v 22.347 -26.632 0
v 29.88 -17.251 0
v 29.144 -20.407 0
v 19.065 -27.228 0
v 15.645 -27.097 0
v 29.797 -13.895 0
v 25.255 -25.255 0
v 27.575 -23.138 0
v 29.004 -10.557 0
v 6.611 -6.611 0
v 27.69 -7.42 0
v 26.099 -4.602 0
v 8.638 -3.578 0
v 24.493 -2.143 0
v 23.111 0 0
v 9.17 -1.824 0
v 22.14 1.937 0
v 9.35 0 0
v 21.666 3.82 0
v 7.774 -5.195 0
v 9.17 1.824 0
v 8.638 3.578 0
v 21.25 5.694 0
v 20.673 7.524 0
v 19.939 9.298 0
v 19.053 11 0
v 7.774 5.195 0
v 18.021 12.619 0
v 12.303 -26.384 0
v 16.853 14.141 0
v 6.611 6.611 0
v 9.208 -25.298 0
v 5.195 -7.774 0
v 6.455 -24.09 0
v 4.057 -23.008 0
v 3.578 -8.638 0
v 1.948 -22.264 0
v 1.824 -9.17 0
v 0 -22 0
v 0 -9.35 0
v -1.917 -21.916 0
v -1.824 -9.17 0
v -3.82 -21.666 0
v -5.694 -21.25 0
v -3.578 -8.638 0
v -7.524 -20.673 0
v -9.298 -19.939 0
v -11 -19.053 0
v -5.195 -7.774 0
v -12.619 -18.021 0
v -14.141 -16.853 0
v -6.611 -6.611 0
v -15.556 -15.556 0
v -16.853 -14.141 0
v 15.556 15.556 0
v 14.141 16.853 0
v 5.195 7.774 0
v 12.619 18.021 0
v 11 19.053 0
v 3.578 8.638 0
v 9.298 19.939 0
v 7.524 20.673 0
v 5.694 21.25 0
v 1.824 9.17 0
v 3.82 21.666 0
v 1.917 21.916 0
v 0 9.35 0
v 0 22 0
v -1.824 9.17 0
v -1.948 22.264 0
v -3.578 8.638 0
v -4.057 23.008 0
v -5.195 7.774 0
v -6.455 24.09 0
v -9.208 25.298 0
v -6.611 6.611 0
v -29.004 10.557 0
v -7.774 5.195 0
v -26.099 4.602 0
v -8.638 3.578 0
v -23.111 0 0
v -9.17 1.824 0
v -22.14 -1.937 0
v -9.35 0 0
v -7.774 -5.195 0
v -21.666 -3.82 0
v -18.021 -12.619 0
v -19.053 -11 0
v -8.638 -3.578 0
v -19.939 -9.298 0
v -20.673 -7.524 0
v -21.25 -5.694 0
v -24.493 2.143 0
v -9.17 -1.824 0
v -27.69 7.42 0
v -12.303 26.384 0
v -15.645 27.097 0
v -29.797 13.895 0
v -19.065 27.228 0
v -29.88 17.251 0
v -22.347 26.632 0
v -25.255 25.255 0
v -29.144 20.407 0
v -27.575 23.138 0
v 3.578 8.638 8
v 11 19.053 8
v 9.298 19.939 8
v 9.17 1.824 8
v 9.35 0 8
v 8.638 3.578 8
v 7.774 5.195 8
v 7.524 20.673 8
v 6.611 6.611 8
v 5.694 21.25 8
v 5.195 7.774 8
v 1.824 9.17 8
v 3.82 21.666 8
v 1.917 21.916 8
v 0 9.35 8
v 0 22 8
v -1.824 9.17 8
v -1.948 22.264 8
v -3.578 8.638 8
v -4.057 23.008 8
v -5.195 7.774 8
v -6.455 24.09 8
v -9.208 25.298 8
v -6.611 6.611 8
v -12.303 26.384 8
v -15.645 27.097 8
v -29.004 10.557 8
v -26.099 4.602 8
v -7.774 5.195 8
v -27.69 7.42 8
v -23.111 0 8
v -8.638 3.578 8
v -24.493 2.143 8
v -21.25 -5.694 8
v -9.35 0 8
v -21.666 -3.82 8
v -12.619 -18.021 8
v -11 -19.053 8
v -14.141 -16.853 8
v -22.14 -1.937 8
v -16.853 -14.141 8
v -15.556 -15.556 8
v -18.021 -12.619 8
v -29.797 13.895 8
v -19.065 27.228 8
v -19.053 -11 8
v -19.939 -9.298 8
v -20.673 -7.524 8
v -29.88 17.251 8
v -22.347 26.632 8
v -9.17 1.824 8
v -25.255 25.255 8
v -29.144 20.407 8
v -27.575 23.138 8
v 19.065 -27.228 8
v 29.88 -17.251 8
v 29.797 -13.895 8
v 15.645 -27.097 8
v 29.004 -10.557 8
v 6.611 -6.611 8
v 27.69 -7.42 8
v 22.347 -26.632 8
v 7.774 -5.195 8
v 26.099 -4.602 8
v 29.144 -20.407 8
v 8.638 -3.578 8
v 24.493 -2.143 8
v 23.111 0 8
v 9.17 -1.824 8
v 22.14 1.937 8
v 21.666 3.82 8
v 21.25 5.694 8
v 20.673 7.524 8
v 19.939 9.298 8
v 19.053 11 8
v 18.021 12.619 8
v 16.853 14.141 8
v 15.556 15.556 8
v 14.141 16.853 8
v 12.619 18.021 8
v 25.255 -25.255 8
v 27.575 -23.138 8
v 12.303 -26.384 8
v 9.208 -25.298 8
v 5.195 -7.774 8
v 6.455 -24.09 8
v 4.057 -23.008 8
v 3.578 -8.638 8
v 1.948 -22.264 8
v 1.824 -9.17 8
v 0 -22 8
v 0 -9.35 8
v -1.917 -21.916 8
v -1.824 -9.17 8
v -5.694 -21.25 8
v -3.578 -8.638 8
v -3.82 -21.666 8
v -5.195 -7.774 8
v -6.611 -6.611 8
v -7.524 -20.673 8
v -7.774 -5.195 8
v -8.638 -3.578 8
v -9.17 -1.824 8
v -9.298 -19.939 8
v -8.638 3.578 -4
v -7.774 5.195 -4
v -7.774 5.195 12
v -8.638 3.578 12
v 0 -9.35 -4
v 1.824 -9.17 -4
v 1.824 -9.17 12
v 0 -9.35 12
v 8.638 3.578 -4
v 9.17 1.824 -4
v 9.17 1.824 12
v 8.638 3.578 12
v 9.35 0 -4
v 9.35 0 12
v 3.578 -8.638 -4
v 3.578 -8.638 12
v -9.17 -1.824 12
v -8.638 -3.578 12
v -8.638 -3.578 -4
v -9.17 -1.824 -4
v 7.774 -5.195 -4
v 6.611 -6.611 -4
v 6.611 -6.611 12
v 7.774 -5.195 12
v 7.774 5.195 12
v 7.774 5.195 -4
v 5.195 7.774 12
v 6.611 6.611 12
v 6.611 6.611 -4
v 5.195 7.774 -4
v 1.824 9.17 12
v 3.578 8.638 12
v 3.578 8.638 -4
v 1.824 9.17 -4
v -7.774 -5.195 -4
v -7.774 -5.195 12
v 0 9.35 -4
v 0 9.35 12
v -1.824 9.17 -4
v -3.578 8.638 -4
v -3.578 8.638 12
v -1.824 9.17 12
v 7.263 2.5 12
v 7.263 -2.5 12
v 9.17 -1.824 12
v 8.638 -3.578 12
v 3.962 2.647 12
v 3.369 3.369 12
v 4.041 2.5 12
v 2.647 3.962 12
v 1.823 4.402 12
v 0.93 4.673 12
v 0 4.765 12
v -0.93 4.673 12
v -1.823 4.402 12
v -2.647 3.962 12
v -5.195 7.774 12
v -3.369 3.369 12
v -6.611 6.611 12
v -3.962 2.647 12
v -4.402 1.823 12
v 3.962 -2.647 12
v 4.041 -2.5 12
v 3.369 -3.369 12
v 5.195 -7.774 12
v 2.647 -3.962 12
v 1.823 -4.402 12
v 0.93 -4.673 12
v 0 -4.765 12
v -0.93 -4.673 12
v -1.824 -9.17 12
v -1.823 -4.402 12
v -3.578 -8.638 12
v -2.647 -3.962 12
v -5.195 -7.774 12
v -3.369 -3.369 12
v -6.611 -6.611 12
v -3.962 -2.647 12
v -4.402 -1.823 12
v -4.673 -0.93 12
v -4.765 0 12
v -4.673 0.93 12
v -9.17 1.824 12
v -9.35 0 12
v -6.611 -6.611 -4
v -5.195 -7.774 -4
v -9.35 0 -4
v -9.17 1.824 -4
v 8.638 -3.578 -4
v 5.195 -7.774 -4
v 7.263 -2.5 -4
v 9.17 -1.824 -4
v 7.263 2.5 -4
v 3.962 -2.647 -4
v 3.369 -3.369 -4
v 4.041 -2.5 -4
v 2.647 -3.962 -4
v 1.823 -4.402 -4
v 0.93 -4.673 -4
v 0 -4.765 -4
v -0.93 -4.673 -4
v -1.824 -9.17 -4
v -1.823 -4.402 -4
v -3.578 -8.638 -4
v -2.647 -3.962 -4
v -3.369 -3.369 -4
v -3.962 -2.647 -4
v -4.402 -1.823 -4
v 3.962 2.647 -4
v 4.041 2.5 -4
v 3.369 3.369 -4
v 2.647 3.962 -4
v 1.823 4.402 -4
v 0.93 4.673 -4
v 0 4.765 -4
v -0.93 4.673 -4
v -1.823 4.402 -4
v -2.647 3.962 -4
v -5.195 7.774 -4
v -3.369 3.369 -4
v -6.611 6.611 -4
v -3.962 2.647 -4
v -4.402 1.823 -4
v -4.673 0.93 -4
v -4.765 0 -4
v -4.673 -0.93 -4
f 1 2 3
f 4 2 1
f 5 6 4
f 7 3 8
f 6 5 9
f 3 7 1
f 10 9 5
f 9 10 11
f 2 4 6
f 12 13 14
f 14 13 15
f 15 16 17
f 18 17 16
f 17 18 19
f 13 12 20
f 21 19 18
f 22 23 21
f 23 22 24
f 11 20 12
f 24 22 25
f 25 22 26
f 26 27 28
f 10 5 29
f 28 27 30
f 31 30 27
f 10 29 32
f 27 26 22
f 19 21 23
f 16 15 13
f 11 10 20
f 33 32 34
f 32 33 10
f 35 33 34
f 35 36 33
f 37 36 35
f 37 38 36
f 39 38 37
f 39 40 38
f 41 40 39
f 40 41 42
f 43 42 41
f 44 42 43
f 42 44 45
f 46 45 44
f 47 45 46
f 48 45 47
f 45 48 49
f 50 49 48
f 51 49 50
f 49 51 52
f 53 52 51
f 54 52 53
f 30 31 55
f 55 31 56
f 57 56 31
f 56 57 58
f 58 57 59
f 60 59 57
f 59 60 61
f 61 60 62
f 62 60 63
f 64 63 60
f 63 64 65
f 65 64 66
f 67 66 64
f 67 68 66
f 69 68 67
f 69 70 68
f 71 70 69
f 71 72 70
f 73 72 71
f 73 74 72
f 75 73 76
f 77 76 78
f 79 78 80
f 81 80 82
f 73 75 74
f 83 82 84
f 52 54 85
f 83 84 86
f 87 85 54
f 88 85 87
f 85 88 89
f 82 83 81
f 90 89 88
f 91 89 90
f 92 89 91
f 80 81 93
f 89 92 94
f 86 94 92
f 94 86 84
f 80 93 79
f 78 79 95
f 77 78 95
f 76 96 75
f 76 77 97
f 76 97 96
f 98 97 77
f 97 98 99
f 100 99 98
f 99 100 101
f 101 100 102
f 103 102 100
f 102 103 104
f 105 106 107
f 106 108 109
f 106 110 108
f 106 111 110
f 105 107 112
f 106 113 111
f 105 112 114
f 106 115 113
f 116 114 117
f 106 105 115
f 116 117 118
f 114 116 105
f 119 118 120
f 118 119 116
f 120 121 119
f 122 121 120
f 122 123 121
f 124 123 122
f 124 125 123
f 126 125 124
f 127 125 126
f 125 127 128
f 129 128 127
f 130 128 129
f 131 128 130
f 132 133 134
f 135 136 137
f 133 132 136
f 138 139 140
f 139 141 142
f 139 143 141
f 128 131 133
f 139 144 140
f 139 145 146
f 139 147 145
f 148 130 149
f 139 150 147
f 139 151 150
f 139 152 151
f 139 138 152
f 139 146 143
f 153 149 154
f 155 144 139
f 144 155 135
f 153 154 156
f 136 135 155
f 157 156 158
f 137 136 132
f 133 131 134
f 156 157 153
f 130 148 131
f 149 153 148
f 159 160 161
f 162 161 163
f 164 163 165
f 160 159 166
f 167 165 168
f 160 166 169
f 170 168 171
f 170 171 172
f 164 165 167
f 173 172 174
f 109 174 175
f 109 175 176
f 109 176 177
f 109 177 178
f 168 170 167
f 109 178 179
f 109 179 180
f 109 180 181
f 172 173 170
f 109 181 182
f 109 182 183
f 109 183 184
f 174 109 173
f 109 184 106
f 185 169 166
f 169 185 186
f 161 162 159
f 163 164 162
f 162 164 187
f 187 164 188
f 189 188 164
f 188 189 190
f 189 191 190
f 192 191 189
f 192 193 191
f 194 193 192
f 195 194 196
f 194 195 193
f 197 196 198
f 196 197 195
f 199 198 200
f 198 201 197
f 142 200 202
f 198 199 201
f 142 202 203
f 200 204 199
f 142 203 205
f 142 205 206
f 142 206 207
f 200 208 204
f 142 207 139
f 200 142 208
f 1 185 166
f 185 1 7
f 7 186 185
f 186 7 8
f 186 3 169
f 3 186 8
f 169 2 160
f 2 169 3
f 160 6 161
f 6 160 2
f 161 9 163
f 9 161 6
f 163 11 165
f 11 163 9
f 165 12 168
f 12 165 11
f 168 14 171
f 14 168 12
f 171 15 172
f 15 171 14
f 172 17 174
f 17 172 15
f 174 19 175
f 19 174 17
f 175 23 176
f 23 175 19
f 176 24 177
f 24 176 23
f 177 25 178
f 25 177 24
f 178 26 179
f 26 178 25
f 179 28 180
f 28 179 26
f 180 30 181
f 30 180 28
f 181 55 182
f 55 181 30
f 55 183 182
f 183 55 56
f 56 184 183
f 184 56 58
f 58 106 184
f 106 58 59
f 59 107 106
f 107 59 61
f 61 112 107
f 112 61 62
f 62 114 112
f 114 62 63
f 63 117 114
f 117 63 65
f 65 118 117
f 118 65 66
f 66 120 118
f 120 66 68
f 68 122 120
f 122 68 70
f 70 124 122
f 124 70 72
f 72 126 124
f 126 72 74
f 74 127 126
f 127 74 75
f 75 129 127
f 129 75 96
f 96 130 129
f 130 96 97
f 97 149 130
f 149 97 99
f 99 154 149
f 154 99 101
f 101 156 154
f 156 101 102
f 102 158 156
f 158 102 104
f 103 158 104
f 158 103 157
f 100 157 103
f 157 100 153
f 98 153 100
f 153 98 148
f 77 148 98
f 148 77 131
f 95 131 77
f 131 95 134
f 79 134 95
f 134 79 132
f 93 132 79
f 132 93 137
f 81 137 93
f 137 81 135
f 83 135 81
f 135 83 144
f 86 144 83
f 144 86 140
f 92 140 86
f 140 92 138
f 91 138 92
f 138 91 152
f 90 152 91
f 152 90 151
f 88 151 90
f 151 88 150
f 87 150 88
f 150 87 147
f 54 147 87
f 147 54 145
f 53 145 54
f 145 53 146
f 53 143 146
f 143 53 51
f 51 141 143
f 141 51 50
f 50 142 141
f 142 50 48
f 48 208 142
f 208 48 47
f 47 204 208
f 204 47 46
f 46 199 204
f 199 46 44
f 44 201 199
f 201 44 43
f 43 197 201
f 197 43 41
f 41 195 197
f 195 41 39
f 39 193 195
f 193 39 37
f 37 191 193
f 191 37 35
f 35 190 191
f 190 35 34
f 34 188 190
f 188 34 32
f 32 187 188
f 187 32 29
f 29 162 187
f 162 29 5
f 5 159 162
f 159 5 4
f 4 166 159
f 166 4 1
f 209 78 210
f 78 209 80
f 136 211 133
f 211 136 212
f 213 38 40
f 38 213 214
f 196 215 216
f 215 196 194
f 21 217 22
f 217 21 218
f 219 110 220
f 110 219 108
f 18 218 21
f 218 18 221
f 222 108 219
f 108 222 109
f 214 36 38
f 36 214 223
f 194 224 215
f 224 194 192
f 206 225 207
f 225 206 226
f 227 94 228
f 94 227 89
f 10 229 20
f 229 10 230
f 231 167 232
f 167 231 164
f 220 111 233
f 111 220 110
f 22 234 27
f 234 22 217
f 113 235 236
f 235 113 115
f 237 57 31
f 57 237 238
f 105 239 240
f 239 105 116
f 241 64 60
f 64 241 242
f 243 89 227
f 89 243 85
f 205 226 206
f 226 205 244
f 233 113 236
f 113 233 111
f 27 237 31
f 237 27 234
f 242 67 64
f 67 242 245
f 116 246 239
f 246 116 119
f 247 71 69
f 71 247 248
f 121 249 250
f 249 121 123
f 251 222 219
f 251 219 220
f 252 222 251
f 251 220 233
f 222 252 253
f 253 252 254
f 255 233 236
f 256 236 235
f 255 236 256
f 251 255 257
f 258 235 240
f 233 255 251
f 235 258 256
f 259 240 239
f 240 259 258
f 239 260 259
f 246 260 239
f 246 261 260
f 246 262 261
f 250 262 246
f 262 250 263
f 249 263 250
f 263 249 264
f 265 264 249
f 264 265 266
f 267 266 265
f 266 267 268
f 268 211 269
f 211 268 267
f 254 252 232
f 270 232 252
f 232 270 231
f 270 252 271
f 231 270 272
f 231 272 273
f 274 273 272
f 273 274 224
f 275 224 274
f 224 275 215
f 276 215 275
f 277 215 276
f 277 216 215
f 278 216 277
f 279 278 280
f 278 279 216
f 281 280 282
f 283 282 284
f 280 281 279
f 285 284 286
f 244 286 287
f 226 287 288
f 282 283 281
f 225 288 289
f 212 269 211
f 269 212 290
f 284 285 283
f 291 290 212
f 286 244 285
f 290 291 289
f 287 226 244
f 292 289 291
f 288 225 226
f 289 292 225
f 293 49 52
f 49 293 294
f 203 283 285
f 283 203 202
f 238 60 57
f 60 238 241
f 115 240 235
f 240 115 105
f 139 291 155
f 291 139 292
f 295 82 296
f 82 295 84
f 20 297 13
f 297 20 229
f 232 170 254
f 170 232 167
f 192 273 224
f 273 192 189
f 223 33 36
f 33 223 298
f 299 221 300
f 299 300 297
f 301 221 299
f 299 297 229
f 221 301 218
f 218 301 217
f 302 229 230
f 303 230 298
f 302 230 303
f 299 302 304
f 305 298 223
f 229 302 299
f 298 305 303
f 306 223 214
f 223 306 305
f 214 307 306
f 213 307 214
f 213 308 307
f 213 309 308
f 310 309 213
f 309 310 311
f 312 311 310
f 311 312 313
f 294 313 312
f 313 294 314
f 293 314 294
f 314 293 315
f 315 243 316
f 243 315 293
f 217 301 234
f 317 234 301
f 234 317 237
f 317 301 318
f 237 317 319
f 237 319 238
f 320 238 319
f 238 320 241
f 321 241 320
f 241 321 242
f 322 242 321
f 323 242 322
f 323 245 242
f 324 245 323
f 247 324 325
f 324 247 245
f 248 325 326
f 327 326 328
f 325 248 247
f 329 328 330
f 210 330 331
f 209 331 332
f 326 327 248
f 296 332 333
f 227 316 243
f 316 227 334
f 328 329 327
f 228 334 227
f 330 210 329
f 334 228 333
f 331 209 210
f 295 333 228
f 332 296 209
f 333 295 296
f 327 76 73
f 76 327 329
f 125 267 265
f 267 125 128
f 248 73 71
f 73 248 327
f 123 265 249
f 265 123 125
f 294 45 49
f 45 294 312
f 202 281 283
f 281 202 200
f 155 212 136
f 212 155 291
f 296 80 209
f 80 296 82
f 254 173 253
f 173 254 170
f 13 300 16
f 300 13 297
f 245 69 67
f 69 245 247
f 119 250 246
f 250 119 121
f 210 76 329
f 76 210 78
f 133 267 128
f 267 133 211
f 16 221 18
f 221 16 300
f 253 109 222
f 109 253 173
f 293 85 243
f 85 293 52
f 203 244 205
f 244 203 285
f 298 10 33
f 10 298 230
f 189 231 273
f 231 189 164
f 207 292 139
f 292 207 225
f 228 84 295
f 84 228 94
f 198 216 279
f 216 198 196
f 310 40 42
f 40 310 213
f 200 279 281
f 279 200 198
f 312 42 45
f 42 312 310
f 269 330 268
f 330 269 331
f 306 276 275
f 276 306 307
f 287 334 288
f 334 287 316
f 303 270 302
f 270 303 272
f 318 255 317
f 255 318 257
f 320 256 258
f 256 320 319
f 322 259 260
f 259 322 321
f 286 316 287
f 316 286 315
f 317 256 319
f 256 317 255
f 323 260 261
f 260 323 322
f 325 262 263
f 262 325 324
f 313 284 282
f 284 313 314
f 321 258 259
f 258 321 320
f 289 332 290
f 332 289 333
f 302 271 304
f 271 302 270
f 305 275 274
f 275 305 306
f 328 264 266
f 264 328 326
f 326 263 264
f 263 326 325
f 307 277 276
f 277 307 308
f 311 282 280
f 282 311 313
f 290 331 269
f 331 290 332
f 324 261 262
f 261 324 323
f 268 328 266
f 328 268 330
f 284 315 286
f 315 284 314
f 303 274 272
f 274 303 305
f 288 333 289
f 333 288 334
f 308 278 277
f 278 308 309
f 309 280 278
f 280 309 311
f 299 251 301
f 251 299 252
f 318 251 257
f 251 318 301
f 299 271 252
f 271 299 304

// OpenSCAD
$fn = 32;

// ----------------------------------------------------------------------
// Cam: base radius 22 mm with a 14 mm lift over 180 degrees
// ----------------------------------------------------------------------

// --- parameters (mm) ---
base_r = 22;              // base radius
lift = 14;                // lift height above the base radius
lift_span = 180;          // angular width of the lift
lift_start = 90;          // angle where the lift starts
cam_t = 8;                // cam plate thickness
hub_d = 18.7;             // hub diameter
hub_h = 16;               // hub height
bore_d = 9.53;            // bore
key_w = 5;                // keyway width
key_depth = 2.5;          // keyway depth

cam_profile = [[23.111, 0], [22.14, 1.937], [21.666, 3.82], [21.25, 5.694], [20.673, 7.524], [19.939, 9.298], [19.053, 11], [18.021, 12.619], [16.853, 14.141], [15.556, 15.556], [14.141, 16.853], [12.619, 18.021], [11, 19.053], [9.298, 19.939], [7.524, 20.673], [5.694, 21.25], [3.82, 21.666], [1.917, 21.916], [0, 22], [-1.948, 22.264], [-4.057, 23.008], [-6.455, 24.09], [-9.208, 25.298], [-12.303, 26.384], [-15.645, 27.097], [-19.065, 27.228], [-22.347, 26.632], [-25.255, 25.255], [-27.575, 23.138], [-29.144, 20.407], [-29.88, 17.251], [-29.797, 13.895], [-29.004, 10.557], [-27.69, 7.42], [-26.099, 4.602], [-24.493, 2.143], [-23.111, 0], [-22.14, -1.937], [-21.666, -3.82], [-21.25, -5.694], [-20.673, -7.524], [-19.939, -9.298], [-19.053, -11], [-18.021, -12.619], [-16.853, -14.141], [-15.556, -15.556], [-14.141, -16.853], [-12.619, -18.021], [-11, -19.053], [-9.298, -19.939], [-7.524, -20.673], [-5.694, -21.25], [-3.82, -21.666], [-1.917, -21.916], [0, -22], [1.948, -22.264], [4.057, -23.008], [6.455, -24.09], [9.208, -25.298], [12.303, -26.384], [15.645, -27.097], [19.065, -27.228], [22.347, -26.632], [25.255, -25.255], [27.575, -23.138], [29.144, -20.407], [29.88, -17.251], [29.797, -13.895], [29.004, -10.557], [27.69, -7.42], [26.099, -4.602], [24.493, -2.143]];

difference() {
  union() {
    linear_extrude(height = cam_t) polygon(cam_profile);
    /* hub, proud of the cam plate on both sides */
    translate([0, 0, -4]) cylinder(h = hub_h, d = hub_d);
  }
  /* bore through the hub, 2.5 mm clear on both faces */
  translate([0, 0, -6.5]) cylinder(h = hub_h + 5, d = bore_d);
  /* keyway, milled through the whole hub */
  translate([2.263, -2.5, -6.5]) cube([5, 5, 21]);
}
